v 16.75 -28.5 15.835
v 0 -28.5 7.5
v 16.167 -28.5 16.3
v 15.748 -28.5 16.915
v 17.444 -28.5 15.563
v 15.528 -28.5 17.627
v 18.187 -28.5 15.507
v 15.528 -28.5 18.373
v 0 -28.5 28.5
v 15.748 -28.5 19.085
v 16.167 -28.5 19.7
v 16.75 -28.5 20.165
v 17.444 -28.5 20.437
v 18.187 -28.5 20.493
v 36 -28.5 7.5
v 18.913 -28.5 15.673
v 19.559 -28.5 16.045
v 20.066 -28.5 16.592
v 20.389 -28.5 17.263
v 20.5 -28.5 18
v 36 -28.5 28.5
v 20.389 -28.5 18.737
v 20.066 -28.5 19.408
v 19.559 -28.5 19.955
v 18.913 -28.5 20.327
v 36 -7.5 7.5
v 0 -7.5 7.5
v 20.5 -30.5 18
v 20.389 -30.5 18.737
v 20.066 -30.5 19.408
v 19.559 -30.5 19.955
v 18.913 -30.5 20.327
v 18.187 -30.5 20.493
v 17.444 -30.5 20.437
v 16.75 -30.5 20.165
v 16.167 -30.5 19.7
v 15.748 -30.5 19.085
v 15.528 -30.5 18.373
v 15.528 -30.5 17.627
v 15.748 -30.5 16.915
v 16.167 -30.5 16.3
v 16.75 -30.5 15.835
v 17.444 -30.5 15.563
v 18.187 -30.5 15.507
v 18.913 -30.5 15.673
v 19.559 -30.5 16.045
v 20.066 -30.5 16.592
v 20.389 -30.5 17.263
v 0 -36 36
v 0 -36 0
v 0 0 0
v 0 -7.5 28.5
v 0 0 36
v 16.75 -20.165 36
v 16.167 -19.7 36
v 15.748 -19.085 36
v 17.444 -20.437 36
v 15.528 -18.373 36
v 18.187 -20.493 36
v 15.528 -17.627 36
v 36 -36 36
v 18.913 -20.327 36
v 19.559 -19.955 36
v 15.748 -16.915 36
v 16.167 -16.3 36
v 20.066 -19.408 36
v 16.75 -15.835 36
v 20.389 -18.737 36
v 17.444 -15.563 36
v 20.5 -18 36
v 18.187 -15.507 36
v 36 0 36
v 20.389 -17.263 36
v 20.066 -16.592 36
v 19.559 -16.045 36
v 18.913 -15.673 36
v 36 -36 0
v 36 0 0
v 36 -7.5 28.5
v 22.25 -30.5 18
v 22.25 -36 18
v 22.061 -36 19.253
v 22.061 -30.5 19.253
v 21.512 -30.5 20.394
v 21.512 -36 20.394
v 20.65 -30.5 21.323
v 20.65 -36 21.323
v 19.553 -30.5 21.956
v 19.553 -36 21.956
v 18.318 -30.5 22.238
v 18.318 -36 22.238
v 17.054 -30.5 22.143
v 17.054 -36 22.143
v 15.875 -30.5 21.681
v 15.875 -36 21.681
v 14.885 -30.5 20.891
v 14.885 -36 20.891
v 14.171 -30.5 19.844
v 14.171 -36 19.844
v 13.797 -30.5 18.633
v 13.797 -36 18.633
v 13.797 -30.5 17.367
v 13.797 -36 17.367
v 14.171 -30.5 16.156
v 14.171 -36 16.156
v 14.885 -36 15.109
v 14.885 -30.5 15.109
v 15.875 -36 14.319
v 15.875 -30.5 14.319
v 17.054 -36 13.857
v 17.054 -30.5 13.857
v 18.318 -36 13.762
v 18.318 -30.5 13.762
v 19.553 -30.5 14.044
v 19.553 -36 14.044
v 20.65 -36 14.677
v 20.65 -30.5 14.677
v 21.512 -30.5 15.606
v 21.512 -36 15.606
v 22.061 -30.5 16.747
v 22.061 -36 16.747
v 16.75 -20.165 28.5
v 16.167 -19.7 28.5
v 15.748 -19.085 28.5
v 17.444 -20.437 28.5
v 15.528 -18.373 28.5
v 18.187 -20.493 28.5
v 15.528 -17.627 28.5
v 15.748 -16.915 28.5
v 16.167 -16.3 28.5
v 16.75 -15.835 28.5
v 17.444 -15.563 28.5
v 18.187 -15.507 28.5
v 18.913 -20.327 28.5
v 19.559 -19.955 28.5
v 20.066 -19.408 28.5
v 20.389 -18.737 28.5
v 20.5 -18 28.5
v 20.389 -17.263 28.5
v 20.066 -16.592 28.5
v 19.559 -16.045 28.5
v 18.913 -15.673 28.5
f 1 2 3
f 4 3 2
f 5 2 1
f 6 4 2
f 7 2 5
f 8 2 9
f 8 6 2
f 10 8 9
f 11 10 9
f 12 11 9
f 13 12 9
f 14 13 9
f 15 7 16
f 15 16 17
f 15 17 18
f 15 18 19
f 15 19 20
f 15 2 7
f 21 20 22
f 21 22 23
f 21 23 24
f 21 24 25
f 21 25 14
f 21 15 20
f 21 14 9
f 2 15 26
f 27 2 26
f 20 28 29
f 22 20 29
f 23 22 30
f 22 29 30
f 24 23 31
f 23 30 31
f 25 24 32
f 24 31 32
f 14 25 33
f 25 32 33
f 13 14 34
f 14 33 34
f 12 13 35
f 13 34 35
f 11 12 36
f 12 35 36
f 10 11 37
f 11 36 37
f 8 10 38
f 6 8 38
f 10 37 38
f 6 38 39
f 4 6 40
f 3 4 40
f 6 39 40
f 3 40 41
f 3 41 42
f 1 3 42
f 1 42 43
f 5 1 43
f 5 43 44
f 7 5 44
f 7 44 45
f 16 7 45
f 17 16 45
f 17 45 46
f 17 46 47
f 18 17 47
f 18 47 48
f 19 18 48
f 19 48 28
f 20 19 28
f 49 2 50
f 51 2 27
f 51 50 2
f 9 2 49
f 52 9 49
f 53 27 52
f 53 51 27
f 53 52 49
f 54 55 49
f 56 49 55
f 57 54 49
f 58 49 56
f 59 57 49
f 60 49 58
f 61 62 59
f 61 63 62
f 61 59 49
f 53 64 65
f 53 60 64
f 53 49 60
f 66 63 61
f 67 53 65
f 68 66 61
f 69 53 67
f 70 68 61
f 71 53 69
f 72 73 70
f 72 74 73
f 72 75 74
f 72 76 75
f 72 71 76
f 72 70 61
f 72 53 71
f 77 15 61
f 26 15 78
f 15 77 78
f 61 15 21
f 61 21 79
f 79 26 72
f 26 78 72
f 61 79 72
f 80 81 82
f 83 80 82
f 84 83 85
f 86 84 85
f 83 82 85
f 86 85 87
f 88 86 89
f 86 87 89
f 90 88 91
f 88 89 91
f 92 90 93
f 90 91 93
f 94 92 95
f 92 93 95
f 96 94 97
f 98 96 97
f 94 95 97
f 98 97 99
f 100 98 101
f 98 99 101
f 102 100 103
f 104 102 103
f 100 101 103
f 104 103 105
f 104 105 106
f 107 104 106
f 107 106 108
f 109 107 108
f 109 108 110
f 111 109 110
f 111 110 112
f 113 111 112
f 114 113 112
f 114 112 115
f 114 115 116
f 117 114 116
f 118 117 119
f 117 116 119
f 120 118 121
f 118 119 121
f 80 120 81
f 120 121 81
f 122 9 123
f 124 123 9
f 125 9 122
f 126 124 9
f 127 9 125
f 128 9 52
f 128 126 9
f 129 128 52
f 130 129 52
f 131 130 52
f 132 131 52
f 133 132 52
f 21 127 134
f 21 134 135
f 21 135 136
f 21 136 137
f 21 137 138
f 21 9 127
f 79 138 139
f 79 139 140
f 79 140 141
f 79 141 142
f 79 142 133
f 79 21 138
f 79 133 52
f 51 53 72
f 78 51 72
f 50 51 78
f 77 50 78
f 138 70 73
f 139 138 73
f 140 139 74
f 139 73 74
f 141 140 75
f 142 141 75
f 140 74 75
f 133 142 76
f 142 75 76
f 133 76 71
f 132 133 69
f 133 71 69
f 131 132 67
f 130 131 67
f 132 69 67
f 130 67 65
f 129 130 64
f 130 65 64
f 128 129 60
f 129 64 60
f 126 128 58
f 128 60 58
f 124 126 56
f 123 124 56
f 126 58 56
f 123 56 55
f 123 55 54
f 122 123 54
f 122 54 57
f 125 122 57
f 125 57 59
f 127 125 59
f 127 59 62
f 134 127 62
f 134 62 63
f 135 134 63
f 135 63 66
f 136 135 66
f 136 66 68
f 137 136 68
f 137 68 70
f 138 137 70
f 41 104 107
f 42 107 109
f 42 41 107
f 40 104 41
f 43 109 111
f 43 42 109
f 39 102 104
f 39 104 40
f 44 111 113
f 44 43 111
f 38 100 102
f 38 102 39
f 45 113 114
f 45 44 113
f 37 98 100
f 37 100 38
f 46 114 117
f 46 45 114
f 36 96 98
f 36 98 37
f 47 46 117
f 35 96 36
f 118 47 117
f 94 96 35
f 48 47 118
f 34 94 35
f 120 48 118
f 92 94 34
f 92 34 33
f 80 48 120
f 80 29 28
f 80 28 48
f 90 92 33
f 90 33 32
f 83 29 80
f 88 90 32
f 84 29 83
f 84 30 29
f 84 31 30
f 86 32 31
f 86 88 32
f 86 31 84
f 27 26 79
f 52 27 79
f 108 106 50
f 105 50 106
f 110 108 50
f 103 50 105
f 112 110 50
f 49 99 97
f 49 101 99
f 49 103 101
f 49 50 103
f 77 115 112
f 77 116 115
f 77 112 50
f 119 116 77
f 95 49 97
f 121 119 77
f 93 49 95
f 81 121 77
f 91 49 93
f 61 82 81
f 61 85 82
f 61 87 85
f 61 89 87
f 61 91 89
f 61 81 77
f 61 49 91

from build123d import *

# Parameters (mm, degrees)
F0_W     = 36
F0_H     = 36
F1_DEPTH = 36
F2_W     = 21
F2_H     = 21
F3_DEPTH = 60
F4_R     = 2.5
F5_DEPTH = 25
F6_R     = 2.5
F7_DEPTH = 20
F8_R     = 4.25
F9_DEPTH = 5.5


with BuildPart() as f1:
    # F0 (on Front) → F1 (new body)
    with BuildSketch(Plane.XZ):
        with Locations((18, 18)):
            Rectangle(F0_W, F0_H)
    extrude(amount=F1_DEPTH)

    # F2 (on face) → F3 (cut)
    with BuildSketch(Plane.YZ.offset(36)):
        with Locations((-18, 18)):
            Rectangle(F2_W, F2_H)
    extrude(amount=-F3_DEPTH, mode=Mode.SUBTRACT)

    # F4 (on face) → F5 (cut)
    with BuildSketch(Plane.XY.offset(36)):
        with Locations((18, -18)):
            Circle(F4_R)
    extrude(amount=-F5_DEPTH, mode=Mode.SUBTRACT)

    # F6 (on face) → F7 (cut)
    with BuildSketch(Plane.XZ.offset(36)):
        with Locations((18, 18)):
            Circle(F6_R)
    extrude(amount=-F7_DEPTH, mode=Mode.SUBTRACT)

    # F8 (on face) → F9 (cut)
    with BuildSketch(Plane.XZ.offset(36)):
        with Locations((18, 18)):
            Circle(F8_R)
    extrude(amount=-F9_DEPTH, mode=Mode.SUBTRACT)


solid = f1.part
